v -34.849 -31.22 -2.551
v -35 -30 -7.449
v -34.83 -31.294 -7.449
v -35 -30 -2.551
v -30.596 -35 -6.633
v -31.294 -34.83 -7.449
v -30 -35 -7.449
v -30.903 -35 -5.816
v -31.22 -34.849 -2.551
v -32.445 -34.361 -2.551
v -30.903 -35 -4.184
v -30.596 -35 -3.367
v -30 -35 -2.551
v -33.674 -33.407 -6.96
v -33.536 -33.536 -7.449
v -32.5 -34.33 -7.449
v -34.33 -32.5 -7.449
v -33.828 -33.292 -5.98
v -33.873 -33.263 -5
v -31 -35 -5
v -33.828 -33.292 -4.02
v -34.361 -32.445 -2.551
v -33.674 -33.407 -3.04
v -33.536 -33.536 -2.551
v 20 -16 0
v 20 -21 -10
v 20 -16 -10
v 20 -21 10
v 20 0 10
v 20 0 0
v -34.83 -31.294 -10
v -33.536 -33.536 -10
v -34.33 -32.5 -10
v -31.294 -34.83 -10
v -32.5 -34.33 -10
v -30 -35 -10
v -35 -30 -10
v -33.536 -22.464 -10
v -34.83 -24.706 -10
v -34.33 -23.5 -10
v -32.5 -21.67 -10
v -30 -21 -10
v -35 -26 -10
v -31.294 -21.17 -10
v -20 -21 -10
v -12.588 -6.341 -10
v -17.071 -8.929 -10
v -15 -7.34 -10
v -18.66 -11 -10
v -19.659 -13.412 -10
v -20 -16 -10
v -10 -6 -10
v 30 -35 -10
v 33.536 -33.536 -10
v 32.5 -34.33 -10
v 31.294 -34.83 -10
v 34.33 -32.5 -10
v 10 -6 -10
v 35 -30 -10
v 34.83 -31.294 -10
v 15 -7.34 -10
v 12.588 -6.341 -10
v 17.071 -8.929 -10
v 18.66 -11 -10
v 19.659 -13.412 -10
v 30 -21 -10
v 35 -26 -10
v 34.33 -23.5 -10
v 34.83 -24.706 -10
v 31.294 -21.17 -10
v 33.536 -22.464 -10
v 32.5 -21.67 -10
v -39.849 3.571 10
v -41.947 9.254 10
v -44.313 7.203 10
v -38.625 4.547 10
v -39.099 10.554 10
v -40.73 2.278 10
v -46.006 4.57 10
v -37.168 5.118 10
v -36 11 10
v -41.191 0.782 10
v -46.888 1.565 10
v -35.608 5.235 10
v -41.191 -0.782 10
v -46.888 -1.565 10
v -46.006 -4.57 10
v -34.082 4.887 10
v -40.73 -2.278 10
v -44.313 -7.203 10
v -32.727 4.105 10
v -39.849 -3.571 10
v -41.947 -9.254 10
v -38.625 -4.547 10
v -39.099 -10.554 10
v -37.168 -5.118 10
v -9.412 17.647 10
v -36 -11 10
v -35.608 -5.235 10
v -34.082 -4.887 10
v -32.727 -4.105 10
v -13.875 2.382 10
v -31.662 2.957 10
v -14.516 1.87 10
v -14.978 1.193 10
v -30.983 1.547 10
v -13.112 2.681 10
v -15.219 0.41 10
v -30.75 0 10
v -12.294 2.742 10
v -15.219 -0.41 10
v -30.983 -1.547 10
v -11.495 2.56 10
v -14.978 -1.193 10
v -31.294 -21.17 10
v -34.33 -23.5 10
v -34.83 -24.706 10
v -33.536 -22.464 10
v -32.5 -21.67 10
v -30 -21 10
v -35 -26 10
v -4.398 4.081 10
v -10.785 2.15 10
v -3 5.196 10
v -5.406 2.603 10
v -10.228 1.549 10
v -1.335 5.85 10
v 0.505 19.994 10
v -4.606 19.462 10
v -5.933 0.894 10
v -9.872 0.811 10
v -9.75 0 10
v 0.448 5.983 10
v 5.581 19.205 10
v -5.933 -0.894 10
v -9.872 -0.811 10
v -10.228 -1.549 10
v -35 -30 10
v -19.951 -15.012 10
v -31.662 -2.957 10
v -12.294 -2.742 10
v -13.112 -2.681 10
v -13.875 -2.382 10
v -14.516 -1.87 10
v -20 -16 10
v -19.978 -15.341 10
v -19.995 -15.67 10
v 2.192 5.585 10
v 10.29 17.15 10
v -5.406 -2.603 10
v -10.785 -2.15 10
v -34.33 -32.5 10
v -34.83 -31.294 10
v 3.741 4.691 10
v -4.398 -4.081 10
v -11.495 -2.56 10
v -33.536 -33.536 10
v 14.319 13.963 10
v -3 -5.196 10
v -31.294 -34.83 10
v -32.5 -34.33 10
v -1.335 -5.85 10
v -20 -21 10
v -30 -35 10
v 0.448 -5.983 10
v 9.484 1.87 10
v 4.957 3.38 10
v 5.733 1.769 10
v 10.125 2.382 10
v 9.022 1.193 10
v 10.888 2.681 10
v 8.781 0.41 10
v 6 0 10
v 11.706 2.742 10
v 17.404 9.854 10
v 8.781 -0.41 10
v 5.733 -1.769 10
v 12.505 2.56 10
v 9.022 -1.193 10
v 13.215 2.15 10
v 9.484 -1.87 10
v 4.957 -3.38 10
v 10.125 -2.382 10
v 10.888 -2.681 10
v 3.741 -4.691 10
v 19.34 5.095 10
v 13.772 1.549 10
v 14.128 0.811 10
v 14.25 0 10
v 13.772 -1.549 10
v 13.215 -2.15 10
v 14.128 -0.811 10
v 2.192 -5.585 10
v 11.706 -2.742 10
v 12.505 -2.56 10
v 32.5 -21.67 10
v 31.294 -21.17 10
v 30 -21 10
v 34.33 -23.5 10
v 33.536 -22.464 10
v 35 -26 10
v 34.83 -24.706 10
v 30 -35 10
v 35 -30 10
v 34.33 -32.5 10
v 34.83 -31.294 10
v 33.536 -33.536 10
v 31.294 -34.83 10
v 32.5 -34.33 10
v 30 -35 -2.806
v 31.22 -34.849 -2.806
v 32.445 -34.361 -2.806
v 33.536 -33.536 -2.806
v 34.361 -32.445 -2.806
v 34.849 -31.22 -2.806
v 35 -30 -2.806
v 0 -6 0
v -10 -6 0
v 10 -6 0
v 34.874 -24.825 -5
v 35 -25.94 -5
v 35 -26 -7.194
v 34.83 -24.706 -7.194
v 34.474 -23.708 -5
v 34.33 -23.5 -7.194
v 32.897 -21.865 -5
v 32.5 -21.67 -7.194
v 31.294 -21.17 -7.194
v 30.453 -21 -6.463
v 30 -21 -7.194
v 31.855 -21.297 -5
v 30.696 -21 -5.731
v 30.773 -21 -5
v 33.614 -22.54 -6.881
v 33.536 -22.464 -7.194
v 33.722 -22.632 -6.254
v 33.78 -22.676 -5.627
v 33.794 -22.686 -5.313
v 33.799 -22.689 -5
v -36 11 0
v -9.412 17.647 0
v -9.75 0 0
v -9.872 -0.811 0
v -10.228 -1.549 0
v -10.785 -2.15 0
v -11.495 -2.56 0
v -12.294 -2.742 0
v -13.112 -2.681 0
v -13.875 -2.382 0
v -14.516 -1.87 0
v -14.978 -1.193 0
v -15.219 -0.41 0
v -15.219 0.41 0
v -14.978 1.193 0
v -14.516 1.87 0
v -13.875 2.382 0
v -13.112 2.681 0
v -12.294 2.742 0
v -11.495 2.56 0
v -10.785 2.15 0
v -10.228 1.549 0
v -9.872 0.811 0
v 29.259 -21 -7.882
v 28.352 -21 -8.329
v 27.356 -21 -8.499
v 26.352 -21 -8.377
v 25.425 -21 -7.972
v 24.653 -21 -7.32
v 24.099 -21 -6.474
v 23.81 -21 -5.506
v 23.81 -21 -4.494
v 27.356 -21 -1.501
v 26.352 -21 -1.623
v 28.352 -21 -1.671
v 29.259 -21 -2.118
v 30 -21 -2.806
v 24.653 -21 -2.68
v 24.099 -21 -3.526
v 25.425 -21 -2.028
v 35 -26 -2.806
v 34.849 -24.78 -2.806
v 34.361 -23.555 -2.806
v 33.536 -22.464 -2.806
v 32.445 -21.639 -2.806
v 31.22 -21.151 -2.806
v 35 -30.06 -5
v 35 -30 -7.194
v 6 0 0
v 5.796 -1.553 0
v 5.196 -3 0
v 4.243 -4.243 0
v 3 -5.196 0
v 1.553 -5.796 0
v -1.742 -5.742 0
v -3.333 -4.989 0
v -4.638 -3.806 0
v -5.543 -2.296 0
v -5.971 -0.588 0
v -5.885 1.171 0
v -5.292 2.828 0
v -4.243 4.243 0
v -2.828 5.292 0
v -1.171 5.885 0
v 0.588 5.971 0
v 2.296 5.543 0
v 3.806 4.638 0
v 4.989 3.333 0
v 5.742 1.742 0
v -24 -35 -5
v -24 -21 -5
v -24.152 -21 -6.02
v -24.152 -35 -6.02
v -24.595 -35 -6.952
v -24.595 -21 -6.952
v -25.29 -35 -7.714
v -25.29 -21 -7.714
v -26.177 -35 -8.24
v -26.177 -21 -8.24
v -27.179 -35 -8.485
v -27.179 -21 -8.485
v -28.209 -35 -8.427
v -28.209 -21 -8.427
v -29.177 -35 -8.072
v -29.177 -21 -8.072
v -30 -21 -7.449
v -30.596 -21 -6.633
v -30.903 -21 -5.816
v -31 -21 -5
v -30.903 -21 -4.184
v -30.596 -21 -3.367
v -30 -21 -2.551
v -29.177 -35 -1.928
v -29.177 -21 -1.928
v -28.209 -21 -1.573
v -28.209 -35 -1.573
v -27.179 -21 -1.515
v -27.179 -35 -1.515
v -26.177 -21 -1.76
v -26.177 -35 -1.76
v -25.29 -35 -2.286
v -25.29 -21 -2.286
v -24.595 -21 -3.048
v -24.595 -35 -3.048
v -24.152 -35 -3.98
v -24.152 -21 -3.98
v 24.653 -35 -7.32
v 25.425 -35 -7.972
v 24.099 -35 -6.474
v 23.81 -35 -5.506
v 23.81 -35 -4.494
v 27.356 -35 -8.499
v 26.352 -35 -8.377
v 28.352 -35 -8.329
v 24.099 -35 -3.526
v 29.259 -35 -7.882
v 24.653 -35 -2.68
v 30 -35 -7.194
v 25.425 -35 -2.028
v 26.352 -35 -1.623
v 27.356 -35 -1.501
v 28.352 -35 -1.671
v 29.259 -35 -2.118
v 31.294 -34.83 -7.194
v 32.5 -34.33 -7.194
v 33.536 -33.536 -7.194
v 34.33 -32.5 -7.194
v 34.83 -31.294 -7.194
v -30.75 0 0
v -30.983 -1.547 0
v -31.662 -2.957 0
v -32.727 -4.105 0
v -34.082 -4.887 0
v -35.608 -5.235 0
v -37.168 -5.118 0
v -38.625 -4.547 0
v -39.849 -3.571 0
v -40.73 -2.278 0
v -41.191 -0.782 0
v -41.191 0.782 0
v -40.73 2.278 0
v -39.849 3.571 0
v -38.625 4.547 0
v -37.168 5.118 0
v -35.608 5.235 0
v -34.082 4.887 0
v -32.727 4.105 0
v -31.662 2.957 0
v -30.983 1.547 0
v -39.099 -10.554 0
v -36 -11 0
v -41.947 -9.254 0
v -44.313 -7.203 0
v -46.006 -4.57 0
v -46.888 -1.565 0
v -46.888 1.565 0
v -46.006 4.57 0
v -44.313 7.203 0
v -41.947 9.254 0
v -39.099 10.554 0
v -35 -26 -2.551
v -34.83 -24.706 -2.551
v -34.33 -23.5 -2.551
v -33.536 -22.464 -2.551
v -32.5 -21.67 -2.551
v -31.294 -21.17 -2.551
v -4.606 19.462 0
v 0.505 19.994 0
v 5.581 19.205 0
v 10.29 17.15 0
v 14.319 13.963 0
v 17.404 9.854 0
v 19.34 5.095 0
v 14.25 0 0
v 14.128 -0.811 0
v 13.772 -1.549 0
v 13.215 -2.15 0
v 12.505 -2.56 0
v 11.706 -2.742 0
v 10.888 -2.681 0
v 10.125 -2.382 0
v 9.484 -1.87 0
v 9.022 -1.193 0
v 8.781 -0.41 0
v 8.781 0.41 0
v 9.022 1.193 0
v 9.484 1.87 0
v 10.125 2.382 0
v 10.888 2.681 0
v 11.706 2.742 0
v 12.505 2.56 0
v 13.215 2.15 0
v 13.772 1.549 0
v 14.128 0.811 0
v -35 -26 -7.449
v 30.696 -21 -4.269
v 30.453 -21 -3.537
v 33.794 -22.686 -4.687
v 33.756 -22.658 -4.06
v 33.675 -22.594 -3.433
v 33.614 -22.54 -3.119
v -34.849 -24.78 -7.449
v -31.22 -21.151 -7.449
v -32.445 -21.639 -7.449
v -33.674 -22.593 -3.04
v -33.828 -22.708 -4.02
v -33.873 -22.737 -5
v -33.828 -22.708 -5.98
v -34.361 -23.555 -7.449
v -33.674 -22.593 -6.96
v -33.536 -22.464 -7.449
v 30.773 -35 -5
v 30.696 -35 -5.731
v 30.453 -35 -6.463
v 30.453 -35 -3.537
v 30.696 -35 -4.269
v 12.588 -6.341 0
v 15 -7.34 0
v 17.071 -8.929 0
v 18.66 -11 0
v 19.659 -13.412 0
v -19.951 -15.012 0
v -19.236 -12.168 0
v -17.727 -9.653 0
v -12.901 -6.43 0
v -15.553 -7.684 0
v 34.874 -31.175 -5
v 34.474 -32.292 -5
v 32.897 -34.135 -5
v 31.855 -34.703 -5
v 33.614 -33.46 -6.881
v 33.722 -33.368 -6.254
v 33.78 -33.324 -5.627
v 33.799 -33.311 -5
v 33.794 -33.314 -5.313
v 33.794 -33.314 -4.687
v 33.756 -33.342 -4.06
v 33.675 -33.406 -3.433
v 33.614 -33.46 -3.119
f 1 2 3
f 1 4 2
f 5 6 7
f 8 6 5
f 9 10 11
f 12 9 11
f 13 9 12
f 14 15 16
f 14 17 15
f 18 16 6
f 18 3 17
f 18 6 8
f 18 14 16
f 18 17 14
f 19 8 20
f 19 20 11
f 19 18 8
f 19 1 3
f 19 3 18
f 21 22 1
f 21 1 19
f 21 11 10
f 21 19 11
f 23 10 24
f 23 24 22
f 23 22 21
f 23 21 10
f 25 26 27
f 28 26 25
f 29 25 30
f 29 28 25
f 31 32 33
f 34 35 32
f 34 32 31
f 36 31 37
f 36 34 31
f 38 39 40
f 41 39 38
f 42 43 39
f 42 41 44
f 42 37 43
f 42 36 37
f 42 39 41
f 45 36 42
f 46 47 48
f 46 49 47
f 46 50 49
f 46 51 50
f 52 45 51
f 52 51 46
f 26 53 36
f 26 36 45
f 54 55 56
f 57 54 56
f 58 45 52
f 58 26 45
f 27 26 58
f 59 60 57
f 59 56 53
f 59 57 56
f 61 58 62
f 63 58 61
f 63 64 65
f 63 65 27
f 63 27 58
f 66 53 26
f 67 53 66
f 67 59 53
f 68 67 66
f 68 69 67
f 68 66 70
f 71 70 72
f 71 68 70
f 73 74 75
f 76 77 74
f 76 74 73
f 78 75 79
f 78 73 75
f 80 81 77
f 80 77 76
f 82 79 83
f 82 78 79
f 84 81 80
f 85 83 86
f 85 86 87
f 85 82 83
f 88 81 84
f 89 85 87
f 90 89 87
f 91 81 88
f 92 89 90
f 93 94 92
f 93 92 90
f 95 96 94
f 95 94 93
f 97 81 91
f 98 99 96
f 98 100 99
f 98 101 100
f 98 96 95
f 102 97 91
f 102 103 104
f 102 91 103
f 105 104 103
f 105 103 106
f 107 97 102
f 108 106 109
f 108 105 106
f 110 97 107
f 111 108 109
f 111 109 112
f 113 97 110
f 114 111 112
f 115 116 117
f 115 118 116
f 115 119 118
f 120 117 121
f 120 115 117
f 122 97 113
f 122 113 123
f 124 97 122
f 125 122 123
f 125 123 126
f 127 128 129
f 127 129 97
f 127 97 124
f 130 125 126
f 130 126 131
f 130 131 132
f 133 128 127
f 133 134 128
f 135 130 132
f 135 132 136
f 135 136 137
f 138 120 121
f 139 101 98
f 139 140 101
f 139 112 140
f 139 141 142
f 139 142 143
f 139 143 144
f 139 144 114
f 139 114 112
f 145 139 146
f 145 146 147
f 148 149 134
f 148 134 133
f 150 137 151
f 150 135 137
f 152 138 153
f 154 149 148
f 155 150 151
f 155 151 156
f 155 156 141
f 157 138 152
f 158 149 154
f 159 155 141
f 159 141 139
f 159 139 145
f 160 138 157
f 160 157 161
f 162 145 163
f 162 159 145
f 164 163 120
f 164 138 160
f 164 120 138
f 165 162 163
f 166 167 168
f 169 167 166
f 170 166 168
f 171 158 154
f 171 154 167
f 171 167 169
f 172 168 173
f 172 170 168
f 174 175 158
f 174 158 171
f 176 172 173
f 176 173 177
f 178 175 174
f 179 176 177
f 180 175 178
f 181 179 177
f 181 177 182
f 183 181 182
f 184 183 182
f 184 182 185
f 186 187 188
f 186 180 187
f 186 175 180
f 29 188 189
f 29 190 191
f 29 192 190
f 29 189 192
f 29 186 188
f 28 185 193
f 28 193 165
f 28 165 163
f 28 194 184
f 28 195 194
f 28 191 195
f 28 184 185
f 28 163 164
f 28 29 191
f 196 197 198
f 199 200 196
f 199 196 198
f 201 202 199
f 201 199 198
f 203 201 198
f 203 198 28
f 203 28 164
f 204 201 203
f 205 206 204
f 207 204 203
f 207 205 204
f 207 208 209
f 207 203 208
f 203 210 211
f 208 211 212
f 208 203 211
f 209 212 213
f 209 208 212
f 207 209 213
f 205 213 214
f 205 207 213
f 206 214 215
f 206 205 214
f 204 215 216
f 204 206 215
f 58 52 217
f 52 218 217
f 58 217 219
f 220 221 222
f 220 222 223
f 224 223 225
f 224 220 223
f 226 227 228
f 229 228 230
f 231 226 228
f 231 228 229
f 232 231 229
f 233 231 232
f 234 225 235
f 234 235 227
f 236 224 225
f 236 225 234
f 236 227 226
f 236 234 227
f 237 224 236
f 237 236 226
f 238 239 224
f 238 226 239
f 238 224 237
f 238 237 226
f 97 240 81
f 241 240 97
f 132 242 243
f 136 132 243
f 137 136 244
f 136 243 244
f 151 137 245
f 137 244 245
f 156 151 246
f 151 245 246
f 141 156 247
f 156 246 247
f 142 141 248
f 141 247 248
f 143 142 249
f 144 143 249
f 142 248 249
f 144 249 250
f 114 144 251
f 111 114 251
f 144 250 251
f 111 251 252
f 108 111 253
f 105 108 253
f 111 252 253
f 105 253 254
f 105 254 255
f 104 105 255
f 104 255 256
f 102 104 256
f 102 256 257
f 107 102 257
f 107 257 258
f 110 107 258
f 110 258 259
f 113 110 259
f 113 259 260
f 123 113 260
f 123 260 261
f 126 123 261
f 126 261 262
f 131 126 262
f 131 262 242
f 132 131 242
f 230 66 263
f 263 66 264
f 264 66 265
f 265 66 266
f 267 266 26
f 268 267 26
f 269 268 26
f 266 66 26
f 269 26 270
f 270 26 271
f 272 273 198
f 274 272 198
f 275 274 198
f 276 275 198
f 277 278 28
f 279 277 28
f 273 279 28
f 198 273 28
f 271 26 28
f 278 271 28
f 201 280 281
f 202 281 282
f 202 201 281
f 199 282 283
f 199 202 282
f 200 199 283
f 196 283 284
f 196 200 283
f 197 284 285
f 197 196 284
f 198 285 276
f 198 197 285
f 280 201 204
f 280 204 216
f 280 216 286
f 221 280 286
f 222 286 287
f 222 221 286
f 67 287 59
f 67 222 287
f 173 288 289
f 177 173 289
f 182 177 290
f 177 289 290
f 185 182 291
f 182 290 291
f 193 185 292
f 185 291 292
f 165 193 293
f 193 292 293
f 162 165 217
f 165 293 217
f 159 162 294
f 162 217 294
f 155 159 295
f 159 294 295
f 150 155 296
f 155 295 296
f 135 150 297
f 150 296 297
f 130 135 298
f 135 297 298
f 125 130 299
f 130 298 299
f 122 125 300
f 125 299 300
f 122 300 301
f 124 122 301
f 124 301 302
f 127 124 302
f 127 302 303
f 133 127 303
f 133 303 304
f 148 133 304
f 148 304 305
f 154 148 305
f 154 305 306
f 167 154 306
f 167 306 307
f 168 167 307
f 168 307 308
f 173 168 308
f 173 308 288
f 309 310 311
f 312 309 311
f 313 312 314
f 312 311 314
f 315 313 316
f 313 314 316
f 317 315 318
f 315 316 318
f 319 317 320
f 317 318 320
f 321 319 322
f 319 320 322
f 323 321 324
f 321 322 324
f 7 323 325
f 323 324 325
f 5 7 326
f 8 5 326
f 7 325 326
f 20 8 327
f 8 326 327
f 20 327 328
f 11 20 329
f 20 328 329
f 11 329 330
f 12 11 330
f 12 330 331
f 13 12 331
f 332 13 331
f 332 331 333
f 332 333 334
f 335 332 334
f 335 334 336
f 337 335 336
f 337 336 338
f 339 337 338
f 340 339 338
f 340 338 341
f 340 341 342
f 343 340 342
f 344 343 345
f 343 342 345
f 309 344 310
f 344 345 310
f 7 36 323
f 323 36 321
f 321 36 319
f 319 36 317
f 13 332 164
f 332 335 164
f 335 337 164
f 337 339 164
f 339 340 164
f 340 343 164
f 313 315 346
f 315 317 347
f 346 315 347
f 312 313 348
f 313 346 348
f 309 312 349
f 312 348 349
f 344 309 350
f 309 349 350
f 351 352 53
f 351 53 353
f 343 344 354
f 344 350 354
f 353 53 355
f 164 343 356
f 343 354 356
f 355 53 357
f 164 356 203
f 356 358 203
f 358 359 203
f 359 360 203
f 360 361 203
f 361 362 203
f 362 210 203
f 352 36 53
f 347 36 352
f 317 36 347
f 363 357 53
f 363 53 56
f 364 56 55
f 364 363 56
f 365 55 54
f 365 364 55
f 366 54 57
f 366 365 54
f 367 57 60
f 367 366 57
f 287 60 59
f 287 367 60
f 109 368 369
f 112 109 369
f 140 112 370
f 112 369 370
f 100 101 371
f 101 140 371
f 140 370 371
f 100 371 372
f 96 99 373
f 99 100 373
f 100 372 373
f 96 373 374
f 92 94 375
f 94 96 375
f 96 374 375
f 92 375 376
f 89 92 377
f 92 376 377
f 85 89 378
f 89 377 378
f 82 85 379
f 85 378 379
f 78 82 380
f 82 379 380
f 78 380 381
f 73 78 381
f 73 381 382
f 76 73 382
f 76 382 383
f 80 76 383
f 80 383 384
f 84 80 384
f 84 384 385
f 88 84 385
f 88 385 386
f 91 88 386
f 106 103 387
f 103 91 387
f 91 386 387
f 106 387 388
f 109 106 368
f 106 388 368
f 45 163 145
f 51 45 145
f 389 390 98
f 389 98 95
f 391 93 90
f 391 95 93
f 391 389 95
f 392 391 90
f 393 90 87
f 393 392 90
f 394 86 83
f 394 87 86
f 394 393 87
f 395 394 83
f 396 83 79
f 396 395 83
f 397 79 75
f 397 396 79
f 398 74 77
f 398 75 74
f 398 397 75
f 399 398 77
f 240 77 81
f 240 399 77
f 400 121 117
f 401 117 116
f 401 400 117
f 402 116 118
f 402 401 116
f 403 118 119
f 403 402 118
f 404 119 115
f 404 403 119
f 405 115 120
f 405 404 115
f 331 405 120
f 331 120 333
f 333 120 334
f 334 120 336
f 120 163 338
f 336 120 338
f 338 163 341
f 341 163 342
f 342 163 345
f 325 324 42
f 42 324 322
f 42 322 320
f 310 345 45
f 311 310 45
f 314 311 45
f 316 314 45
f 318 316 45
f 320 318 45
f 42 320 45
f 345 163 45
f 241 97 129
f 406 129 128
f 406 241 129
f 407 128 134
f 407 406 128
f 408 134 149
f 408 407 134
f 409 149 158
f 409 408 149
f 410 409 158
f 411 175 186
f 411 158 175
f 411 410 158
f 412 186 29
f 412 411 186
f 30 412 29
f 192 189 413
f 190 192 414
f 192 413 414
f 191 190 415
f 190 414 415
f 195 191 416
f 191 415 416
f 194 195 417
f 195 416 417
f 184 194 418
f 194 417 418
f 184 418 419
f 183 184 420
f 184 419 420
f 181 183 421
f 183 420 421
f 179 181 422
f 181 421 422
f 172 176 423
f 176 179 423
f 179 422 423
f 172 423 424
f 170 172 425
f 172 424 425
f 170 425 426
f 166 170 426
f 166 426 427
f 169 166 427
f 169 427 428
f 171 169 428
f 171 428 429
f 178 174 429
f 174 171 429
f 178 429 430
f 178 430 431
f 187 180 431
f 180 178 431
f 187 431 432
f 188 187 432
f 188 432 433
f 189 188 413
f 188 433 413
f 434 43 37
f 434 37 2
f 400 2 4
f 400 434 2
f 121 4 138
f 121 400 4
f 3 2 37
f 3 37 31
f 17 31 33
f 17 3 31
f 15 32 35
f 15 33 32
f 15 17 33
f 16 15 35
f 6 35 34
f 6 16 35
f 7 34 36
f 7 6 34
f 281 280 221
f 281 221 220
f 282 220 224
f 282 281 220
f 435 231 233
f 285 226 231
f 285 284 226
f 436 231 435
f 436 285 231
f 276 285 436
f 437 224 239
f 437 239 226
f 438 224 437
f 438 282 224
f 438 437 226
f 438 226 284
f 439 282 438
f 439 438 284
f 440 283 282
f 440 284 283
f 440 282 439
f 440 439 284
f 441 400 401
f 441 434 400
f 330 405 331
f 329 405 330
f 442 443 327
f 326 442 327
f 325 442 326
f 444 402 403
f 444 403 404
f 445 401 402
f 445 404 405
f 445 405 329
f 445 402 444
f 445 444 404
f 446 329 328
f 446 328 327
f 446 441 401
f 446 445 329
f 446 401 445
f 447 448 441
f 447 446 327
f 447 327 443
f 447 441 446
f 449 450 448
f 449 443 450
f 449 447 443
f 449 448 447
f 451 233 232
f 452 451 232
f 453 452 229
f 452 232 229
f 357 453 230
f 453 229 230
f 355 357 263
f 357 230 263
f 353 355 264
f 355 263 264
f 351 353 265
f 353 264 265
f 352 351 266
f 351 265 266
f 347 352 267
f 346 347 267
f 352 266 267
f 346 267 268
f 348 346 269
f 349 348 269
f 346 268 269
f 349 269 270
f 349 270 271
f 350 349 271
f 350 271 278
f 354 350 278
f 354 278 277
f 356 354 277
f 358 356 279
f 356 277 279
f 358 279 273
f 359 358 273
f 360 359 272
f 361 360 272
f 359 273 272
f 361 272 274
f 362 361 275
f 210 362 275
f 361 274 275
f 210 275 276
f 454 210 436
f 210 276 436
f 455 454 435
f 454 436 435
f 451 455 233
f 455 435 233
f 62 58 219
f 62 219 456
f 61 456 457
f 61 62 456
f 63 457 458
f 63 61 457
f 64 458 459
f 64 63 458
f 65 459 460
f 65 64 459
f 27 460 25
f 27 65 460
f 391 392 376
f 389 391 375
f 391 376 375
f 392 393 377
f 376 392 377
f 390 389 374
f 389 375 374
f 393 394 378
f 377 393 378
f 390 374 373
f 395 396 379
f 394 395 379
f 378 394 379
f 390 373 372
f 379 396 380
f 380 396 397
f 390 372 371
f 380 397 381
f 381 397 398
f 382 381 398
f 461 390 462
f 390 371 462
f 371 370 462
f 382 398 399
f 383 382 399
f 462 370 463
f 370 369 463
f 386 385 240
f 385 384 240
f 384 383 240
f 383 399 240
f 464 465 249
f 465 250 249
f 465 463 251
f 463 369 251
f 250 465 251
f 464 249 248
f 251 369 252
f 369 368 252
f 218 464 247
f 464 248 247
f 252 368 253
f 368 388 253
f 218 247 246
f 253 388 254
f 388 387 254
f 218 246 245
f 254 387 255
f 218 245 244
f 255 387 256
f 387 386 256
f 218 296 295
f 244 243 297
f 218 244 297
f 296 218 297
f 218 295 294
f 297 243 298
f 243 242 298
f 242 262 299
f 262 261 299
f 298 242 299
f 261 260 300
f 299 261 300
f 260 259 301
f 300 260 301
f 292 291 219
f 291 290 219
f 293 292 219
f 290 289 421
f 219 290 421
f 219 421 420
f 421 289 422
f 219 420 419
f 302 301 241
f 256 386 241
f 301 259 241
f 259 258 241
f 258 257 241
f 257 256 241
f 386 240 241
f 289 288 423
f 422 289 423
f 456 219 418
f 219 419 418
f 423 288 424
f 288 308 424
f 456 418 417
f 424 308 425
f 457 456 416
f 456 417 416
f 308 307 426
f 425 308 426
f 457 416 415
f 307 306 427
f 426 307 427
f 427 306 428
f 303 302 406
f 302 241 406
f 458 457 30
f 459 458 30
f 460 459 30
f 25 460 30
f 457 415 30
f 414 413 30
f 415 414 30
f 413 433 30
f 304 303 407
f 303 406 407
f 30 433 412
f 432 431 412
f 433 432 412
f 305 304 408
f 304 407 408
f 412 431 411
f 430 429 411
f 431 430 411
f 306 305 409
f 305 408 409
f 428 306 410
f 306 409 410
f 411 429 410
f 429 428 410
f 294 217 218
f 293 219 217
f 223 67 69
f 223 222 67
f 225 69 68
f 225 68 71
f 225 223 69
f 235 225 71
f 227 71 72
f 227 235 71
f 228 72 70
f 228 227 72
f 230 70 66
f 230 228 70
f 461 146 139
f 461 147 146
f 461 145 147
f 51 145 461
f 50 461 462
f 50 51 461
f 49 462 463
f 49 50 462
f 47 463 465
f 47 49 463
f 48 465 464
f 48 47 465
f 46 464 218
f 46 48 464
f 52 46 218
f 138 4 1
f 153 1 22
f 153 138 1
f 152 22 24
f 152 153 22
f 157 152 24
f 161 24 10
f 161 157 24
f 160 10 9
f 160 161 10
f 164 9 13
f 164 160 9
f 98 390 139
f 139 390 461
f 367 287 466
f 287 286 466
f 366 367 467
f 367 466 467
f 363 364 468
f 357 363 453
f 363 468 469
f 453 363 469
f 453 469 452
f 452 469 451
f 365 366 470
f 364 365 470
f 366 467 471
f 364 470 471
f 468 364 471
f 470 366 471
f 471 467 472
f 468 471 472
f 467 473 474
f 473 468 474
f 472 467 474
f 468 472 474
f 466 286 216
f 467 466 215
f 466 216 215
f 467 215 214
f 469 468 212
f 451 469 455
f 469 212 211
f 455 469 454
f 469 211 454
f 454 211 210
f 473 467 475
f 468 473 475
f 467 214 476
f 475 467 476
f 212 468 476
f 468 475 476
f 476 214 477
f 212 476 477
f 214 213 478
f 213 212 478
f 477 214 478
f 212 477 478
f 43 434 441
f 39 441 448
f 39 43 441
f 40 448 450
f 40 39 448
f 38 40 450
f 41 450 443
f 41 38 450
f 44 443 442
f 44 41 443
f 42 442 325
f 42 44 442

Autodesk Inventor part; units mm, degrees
ref_plane "YZ Plane" through (0, 0, 0) normal (1, 0, 0) x (0, 1, 0)
ref_plane "XZ Plane" through (0, 0, 0) normal (0, 1, 0) x (-1, 0, 0)
ref_plane "XY Plane" through (0, 0, 0) normal (0, 0, 1) x (1, 0, 0)
sketch "Sketch1" plane through (0, 0, 0) normal (0, 0, 1) x (1, 0, 0)
  circle A0 centre (0, 0) radius 20
  circle A1 centre (0, 0) radius 6
  line L0 (0, 0) -> (-12.5, 0)
  line L1 (0, 0) -> (11.5, 0)
  circle A2 centre (-12.5, 0) radius 2.75
  circle A3 centre (11.5, 0) radius 2.75
  line L2 (0, 0) -> (-36, 0)
  circle A4 centre (-36, 0) radius 5.25
  circle A5 centre (-36, 0) radius 11
  line L3 (-36, 11) -> (0, 20)
  line L4 (-36, -11) -> (0, -20)
  line L5 (20, 0) -> (-20, 0)
  line L6 (-20, 0) -> (-20, 20)
  line L7 (-20, 20) -> (20, 20)
  line L8 (20, 20) -> (20, 0)
  line L9 (-20, 0) -> (20, 0)
  line L10 (20, 0) -> (20, -35)
  line L11 (20, -35) -> (-20, -35)
  line L12 (-20, -35) -> (-20, 0)
  point P0 (-9.4118, -17.6471)
  point P1 (-9.4118, 17.6471)
  point P2 (-20, -15)
  dimension "d0" = 40
  dimension "d1" = 12
  dimension "d2" = 12.5
  dimension "d3" = 11.5
  dimension "d4" = 5.5
  dimension "d5" = 5.5
  dimension "d8" = 36
  dimension "d9" = 10.5
  dimension "d10" = 22
  dimension "d11" = 40
  dimension "d12" = 20
  dimension "d13" = 40
  dimension "d14" = 35
extrude "Extrusion1" add sketch "Sketch1" along normal blind 10 contours L5 A3 L1 A1 L0 A2 L2 A0 L3 | L10 L11 L12 L4 A0 | A0 L4 L2 A2 L0 A1 L1 A3 L5 | L3 A0 | A0 L4 | A0 L6 L3 | L4 L12 A0 | L12 L4 A5 L2 | L2 A5 L3 L6 | A5
sketch "Sketch3" plane through (0, 0, 0) normal (0, 0, -1) x (-1, 0, 0)
  line L0 (-20, -35) -> (-20, 0) projected
  line L1 (-20, -35) -> (20, -35)
  line L2 (20, -35) -> (20, -6)
  line L3 (20, -6) -> (-20, -6)
  line L4 (-20, -6) -> (-20, -35)
  point P0 (0, 0)
  point P1 (-20, -6)
  dimension "d15" = 40
  dimension "d16" = 29
extrude "Extrusion2" add sketch "Sketch3" along normal blind 10
fillet "Fillet3" radius 10 1 edges at (-20, -6, -5)
fillet "Fillet4" radius 10 1 edges at (20, -6, -5)
sketch "Sketch4" plane through (20, -35, 10) normal (1, 0, 0) x (0, 0, -1)
  line L0 (20, 0) -> (0, 0) projected
  line L1 (0, 0) -> (20, 0)
  line L2 (20, 0) -> (20, 14)
  line L3 (20, 14) -> (0, 14)
  line L4 (0, 14) -> (0, 0)
  point P0 (10, 35)
  dimension "d23" = 20
  dimension "d24" = 14
extrude "Extrusion3" add sketch "Sketch4" along normal blind 15
sketch "Sketch5" plane through (-20, -35, -10) normal (-1, 0, 0) x (0, 0, 1)
  line L0 (0, 0) -> (0, 14) projected
  line L1 (20, 14) -> (20, 0) projected
  line L2 (0, 0) -> (20, 0)
  line L3 (20, 0) -> (20, 14)
  line L4 (20, 14) -> (0, 14)
  line L5 (0, 14) -> (0, 0)
  point P0 (10, 35)
  dimension "d27" = 20
extrude "Extrusion4" add sketch "Sketch5" along normal blind 15
sketch "Sketch6" plane through (-20, -21, 10) normal (0, 1, 0) x (1, 0, 0)
  circle A0 centre (-7.5, 15) radius 3.5
  point P0 (20, 10)
  dimension "d30" = 7
sketch "Sketch7" plane through (20, -21, 10) normal (0, 1, 0) x (1, 0, 0)
  circle A0 centre (7.273, 15) radius 3.5
  point P0 (-20, 10)
  dimension "d31" = 7
extrude "Extrusion5" cut sketch "Sketch7" against normal blind 15
extrude "Extrusion6" cut sketch "Sketch6" against normal blind 15
fillet "Fillet5" radius 5 1 edges at (35, -35, 0)
fillet "Fillet6" radius 5 1 edges at (35, -21, 0)
fillet "Fillet7" radius 5 1 edges at (-35, -35, 0)
fillet "Fillet8" radius 5 1 edges at (-35, -21, 0)
properties part number "suportCaptor"
